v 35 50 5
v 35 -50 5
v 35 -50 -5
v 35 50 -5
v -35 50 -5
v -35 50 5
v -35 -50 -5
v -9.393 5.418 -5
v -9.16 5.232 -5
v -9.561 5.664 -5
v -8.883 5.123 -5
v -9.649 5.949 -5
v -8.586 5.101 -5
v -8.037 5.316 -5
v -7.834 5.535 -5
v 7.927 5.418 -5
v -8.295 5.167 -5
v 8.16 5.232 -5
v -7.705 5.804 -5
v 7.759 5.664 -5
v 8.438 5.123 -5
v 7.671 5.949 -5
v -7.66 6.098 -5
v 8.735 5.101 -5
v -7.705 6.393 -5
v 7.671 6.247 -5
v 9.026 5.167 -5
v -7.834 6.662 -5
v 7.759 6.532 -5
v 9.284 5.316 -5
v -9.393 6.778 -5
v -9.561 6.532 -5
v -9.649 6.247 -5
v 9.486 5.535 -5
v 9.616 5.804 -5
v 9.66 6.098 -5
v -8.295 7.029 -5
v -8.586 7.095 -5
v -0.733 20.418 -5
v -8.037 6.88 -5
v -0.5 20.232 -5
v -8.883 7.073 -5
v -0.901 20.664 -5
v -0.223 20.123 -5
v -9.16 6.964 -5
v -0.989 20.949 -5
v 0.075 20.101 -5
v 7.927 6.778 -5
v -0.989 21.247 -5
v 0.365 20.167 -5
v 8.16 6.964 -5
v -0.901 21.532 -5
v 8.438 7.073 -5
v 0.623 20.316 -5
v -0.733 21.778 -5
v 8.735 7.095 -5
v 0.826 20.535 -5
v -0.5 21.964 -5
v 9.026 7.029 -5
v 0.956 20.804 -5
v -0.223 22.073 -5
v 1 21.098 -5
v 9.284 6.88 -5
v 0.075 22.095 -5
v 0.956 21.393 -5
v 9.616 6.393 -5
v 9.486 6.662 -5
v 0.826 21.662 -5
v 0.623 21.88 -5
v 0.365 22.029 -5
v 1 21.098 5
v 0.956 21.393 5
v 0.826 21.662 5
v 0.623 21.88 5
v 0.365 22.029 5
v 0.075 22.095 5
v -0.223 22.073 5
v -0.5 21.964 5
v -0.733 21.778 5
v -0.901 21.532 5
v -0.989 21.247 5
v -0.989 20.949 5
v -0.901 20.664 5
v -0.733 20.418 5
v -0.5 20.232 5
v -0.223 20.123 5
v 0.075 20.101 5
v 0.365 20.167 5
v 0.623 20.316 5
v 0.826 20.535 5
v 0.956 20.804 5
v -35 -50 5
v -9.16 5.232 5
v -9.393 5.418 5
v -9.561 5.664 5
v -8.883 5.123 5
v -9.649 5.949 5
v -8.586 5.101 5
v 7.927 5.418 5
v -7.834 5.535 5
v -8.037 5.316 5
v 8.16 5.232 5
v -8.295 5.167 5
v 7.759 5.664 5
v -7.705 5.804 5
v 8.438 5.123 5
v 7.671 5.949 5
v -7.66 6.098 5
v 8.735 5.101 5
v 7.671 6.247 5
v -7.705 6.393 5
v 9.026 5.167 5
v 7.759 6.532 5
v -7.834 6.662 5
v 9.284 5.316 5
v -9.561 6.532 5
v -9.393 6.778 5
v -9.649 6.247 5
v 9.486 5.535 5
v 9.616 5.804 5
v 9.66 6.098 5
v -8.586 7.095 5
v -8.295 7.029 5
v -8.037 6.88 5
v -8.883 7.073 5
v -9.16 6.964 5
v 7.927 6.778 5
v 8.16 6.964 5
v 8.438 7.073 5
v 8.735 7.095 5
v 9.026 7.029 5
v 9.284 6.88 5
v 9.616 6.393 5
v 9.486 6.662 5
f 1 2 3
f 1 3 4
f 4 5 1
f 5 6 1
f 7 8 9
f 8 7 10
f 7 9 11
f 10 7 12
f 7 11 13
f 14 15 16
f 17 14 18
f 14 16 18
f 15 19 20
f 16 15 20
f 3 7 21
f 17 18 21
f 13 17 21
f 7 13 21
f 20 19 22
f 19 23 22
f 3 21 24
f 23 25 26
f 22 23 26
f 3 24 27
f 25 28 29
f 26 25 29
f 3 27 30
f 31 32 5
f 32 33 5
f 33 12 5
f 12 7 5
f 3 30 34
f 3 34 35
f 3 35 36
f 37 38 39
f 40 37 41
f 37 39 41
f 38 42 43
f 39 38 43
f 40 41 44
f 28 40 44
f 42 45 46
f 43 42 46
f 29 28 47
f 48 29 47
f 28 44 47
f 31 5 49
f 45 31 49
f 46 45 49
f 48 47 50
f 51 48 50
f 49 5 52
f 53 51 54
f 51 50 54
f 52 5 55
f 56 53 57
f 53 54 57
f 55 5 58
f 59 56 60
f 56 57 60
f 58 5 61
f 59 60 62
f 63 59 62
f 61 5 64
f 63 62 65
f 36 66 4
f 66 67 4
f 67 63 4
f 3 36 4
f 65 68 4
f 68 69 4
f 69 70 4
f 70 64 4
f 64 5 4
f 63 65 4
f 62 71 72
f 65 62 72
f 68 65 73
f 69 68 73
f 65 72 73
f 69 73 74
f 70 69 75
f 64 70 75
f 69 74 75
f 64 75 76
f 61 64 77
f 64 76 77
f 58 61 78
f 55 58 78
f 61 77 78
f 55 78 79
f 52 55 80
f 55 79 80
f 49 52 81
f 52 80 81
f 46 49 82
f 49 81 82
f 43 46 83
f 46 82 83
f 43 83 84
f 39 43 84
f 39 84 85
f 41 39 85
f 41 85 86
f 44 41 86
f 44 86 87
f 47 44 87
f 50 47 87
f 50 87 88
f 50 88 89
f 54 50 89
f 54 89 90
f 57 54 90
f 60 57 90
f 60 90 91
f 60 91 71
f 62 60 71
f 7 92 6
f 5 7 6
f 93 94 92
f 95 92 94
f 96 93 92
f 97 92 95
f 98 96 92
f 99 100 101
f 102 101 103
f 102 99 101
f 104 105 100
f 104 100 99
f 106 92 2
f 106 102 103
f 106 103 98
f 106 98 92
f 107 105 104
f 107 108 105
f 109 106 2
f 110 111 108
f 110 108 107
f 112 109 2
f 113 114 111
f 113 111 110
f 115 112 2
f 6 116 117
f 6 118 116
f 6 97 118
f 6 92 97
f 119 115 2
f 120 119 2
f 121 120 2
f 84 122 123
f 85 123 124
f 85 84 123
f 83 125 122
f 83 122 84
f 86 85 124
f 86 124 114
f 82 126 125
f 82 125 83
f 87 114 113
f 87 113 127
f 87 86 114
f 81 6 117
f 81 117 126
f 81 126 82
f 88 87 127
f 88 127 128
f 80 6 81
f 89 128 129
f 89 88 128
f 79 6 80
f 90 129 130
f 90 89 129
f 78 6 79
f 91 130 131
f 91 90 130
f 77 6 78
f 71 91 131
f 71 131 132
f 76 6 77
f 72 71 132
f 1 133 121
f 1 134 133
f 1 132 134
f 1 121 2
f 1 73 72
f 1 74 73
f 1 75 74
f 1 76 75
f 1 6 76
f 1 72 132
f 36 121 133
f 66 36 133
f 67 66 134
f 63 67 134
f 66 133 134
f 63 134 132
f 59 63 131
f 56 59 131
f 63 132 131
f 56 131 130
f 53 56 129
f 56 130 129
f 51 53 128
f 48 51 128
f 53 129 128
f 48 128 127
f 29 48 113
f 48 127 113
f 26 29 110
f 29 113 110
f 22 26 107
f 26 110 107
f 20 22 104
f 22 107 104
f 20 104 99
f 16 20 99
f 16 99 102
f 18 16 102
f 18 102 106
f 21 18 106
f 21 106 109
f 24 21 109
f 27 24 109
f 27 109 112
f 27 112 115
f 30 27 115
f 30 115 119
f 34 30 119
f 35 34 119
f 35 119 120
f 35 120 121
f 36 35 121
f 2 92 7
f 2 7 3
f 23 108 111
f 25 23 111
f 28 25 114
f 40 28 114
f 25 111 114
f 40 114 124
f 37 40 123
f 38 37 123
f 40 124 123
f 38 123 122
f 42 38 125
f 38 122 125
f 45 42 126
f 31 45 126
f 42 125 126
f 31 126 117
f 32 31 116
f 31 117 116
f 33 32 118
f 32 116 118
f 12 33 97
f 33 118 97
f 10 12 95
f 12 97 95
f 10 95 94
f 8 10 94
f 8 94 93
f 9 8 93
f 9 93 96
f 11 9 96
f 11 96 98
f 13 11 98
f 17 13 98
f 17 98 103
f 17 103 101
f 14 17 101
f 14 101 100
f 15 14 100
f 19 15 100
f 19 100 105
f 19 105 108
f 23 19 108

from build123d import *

# Parameters (mm, degrees)
SKETCH1_W           = 70
SKETCH1_H           = 100
BOSS_EXTRUDE1_DEPTH = 5
SKETCH2_R           = 1
CUT_EXTRUDE1_DEPTH  = 62.846584384


with BuildPart() as part:
    # Sketch1 → Boss-Extrude1 (new, symmetric)
    with BuildSketch(Plane.XY):
        Rectangle(SKETCH1_W, SKETCH1_H)
    extrude(amount=BOSS_EXTRUDE1_DEPTH, both=True)

    # Sketch2 → Cut-Extrude1 (cut, through all)
    with BuildSketch(Plane.XY.offset(5)):
        with Locations((0, 21.098295345)):
            Circle(SKETCH2_R)
        with Locations((8.660254038, 6.098295345)):
            Circle(SKETCH2_R)
        with Locations((-8.660254038, 6.098295345)):
            Circle(SKETCH2_R)
    extrude(amount=-CUT_EXTRUDE1_DEPTH, mode=Mode.SUBTRACT)


solid = part.part
